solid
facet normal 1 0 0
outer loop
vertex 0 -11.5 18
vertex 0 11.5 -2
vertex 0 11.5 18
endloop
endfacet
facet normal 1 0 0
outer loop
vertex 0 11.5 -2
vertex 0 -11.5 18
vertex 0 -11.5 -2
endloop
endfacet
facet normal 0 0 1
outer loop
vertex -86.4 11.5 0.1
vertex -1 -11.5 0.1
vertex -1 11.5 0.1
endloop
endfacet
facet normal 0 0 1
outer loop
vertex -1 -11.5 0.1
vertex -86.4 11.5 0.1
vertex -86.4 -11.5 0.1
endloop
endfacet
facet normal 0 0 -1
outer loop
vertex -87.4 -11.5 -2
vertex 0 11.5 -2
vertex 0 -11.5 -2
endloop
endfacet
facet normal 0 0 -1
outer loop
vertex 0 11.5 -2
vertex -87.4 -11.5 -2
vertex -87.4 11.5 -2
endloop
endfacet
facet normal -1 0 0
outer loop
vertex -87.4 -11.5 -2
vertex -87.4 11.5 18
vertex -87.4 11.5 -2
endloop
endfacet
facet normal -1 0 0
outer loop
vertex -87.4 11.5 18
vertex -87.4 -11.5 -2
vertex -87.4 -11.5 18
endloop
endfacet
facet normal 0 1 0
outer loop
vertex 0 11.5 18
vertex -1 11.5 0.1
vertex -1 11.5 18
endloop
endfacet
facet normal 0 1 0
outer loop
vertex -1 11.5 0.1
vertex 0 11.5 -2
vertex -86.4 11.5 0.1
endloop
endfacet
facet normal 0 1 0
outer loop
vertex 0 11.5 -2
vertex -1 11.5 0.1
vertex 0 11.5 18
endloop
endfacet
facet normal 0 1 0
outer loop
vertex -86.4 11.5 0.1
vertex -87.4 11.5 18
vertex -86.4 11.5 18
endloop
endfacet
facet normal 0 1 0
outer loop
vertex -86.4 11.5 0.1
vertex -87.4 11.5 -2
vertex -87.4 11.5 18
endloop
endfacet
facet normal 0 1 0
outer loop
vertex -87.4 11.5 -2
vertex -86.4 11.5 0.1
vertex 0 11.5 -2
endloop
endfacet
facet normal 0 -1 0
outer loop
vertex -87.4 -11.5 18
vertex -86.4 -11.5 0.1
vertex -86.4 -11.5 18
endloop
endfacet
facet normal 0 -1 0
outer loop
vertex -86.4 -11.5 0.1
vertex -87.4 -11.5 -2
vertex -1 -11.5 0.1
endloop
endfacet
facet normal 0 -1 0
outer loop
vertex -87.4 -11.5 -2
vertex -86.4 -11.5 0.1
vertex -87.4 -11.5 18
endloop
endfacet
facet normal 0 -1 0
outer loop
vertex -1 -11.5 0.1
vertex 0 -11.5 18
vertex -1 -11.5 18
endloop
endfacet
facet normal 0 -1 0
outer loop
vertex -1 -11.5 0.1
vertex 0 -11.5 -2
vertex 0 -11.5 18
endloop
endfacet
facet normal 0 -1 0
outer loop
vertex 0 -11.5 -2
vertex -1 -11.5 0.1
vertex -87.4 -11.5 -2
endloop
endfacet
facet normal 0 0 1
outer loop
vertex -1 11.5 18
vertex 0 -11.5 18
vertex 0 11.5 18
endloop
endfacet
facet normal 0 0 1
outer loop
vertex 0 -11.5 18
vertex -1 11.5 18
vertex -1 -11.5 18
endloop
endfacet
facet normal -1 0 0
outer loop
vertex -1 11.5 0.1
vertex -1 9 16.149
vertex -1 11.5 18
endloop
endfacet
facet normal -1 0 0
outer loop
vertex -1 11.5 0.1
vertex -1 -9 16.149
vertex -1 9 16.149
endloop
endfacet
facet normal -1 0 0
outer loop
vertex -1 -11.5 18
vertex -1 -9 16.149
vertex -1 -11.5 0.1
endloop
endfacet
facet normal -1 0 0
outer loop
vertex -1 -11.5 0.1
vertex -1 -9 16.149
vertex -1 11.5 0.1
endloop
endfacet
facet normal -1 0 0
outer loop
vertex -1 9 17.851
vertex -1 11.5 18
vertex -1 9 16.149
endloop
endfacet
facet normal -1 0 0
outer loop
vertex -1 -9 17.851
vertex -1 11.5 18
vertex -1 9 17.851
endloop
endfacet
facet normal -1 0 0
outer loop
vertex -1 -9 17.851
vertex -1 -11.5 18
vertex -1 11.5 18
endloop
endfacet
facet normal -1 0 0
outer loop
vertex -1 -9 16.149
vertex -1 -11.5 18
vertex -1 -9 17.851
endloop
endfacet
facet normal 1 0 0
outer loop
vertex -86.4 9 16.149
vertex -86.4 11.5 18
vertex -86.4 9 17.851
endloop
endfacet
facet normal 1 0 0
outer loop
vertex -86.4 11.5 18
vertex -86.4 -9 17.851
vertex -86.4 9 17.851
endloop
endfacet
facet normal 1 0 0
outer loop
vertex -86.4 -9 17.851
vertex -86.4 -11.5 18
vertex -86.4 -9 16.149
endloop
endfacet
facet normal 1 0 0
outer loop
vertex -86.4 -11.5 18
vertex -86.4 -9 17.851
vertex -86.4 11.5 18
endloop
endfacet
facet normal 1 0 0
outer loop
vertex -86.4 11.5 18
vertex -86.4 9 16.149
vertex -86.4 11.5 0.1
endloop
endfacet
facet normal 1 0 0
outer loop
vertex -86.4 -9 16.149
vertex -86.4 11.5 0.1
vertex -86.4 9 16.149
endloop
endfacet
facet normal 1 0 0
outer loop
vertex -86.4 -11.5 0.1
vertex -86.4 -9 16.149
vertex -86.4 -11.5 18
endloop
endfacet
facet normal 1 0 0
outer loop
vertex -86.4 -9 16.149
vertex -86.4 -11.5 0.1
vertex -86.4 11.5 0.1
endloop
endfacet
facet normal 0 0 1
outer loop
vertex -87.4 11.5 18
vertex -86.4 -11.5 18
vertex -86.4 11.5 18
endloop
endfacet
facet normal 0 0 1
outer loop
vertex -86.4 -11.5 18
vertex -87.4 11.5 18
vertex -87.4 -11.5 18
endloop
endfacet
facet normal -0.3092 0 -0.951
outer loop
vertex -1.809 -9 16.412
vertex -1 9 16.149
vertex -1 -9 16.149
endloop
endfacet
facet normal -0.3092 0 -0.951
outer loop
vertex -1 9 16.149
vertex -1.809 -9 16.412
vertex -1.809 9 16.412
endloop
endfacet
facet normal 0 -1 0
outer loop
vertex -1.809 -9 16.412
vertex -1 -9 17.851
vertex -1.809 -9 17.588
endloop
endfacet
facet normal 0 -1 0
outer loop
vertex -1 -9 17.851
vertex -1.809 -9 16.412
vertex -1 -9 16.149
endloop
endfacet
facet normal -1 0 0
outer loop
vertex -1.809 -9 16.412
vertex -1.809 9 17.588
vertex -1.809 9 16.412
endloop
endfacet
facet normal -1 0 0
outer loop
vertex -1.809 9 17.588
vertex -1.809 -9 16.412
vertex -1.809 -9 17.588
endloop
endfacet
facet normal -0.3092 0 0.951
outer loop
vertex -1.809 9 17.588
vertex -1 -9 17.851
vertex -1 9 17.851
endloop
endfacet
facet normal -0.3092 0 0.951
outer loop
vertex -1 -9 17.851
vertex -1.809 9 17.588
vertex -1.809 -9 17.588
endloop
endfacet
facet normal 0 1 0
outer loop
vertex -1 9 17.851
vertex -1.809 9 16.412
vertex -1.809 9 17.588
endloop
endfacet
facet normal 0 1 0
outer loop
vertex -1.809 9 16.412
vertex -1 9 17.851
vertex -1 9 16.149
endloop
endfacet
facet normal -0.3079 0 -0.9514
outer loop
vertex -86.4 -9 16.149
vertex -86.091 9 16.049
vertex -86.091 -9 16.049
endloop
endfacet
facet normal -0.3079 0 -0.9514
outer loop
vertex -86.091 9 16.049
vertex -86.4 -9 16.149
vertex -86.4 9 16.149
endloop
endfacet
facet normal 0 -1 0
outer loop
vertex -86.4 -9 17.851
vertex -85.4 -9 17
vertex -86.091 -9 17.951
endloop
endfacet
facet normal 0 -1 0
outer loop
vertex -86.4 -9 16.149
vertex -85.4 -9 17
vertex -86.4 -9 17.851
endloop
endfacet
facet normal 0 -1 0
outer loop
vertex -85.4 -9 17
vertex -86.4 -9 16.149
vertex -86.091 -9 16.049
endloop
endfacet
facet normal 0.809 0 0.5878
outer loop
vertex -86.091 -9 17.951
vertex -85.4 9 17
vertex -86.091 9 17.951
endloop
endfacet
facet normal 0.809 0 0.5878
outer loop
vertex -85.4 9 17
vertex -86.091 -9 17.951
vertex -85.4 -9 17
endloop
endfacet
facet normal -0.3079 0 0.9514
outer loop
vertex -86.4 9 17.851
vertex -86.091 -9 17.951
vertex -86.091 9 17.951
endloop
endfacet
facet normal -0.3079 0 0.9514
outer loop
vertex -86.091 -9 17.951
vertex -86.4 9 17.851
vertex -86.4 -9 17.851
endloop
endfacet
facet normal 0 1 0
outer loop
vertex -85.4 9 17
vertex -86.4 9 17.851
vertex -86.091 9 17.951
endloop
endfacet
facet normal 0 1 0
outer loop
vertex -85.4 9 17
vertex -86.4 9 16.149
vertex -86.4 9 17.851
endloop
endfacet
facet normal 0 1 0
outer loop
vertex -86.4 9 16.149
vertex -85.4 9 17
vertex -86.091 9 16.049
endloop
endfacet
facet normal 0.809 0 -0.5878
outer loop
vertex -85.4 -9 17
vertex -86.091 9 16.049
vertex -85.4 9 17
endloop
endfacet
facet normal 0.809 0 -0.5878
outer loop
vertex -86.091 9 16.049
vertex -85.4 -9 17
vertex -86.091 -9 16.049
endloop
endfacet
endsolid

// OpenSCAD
// Startpoint Fensteralarm top:

le=87.4;
br=26;

union(){

     translate ([-le,-br/2+1.5,-2])cube([le, br-3,2.1]);

     translate([0-1,-br/2+1.5,0])cube([1,br-3,18]);
     translate([0-le,-br/2+1.5,0])cube([1,br-3,18]);

    translate([0-1,0,17])rotate([90,0,0])cylinder(br-8, 1, 1, center=true);
    translate([0-le+1,0,17])rotate([90,0,0])cylinder(br-8, 1, 1, center=true);

 }
